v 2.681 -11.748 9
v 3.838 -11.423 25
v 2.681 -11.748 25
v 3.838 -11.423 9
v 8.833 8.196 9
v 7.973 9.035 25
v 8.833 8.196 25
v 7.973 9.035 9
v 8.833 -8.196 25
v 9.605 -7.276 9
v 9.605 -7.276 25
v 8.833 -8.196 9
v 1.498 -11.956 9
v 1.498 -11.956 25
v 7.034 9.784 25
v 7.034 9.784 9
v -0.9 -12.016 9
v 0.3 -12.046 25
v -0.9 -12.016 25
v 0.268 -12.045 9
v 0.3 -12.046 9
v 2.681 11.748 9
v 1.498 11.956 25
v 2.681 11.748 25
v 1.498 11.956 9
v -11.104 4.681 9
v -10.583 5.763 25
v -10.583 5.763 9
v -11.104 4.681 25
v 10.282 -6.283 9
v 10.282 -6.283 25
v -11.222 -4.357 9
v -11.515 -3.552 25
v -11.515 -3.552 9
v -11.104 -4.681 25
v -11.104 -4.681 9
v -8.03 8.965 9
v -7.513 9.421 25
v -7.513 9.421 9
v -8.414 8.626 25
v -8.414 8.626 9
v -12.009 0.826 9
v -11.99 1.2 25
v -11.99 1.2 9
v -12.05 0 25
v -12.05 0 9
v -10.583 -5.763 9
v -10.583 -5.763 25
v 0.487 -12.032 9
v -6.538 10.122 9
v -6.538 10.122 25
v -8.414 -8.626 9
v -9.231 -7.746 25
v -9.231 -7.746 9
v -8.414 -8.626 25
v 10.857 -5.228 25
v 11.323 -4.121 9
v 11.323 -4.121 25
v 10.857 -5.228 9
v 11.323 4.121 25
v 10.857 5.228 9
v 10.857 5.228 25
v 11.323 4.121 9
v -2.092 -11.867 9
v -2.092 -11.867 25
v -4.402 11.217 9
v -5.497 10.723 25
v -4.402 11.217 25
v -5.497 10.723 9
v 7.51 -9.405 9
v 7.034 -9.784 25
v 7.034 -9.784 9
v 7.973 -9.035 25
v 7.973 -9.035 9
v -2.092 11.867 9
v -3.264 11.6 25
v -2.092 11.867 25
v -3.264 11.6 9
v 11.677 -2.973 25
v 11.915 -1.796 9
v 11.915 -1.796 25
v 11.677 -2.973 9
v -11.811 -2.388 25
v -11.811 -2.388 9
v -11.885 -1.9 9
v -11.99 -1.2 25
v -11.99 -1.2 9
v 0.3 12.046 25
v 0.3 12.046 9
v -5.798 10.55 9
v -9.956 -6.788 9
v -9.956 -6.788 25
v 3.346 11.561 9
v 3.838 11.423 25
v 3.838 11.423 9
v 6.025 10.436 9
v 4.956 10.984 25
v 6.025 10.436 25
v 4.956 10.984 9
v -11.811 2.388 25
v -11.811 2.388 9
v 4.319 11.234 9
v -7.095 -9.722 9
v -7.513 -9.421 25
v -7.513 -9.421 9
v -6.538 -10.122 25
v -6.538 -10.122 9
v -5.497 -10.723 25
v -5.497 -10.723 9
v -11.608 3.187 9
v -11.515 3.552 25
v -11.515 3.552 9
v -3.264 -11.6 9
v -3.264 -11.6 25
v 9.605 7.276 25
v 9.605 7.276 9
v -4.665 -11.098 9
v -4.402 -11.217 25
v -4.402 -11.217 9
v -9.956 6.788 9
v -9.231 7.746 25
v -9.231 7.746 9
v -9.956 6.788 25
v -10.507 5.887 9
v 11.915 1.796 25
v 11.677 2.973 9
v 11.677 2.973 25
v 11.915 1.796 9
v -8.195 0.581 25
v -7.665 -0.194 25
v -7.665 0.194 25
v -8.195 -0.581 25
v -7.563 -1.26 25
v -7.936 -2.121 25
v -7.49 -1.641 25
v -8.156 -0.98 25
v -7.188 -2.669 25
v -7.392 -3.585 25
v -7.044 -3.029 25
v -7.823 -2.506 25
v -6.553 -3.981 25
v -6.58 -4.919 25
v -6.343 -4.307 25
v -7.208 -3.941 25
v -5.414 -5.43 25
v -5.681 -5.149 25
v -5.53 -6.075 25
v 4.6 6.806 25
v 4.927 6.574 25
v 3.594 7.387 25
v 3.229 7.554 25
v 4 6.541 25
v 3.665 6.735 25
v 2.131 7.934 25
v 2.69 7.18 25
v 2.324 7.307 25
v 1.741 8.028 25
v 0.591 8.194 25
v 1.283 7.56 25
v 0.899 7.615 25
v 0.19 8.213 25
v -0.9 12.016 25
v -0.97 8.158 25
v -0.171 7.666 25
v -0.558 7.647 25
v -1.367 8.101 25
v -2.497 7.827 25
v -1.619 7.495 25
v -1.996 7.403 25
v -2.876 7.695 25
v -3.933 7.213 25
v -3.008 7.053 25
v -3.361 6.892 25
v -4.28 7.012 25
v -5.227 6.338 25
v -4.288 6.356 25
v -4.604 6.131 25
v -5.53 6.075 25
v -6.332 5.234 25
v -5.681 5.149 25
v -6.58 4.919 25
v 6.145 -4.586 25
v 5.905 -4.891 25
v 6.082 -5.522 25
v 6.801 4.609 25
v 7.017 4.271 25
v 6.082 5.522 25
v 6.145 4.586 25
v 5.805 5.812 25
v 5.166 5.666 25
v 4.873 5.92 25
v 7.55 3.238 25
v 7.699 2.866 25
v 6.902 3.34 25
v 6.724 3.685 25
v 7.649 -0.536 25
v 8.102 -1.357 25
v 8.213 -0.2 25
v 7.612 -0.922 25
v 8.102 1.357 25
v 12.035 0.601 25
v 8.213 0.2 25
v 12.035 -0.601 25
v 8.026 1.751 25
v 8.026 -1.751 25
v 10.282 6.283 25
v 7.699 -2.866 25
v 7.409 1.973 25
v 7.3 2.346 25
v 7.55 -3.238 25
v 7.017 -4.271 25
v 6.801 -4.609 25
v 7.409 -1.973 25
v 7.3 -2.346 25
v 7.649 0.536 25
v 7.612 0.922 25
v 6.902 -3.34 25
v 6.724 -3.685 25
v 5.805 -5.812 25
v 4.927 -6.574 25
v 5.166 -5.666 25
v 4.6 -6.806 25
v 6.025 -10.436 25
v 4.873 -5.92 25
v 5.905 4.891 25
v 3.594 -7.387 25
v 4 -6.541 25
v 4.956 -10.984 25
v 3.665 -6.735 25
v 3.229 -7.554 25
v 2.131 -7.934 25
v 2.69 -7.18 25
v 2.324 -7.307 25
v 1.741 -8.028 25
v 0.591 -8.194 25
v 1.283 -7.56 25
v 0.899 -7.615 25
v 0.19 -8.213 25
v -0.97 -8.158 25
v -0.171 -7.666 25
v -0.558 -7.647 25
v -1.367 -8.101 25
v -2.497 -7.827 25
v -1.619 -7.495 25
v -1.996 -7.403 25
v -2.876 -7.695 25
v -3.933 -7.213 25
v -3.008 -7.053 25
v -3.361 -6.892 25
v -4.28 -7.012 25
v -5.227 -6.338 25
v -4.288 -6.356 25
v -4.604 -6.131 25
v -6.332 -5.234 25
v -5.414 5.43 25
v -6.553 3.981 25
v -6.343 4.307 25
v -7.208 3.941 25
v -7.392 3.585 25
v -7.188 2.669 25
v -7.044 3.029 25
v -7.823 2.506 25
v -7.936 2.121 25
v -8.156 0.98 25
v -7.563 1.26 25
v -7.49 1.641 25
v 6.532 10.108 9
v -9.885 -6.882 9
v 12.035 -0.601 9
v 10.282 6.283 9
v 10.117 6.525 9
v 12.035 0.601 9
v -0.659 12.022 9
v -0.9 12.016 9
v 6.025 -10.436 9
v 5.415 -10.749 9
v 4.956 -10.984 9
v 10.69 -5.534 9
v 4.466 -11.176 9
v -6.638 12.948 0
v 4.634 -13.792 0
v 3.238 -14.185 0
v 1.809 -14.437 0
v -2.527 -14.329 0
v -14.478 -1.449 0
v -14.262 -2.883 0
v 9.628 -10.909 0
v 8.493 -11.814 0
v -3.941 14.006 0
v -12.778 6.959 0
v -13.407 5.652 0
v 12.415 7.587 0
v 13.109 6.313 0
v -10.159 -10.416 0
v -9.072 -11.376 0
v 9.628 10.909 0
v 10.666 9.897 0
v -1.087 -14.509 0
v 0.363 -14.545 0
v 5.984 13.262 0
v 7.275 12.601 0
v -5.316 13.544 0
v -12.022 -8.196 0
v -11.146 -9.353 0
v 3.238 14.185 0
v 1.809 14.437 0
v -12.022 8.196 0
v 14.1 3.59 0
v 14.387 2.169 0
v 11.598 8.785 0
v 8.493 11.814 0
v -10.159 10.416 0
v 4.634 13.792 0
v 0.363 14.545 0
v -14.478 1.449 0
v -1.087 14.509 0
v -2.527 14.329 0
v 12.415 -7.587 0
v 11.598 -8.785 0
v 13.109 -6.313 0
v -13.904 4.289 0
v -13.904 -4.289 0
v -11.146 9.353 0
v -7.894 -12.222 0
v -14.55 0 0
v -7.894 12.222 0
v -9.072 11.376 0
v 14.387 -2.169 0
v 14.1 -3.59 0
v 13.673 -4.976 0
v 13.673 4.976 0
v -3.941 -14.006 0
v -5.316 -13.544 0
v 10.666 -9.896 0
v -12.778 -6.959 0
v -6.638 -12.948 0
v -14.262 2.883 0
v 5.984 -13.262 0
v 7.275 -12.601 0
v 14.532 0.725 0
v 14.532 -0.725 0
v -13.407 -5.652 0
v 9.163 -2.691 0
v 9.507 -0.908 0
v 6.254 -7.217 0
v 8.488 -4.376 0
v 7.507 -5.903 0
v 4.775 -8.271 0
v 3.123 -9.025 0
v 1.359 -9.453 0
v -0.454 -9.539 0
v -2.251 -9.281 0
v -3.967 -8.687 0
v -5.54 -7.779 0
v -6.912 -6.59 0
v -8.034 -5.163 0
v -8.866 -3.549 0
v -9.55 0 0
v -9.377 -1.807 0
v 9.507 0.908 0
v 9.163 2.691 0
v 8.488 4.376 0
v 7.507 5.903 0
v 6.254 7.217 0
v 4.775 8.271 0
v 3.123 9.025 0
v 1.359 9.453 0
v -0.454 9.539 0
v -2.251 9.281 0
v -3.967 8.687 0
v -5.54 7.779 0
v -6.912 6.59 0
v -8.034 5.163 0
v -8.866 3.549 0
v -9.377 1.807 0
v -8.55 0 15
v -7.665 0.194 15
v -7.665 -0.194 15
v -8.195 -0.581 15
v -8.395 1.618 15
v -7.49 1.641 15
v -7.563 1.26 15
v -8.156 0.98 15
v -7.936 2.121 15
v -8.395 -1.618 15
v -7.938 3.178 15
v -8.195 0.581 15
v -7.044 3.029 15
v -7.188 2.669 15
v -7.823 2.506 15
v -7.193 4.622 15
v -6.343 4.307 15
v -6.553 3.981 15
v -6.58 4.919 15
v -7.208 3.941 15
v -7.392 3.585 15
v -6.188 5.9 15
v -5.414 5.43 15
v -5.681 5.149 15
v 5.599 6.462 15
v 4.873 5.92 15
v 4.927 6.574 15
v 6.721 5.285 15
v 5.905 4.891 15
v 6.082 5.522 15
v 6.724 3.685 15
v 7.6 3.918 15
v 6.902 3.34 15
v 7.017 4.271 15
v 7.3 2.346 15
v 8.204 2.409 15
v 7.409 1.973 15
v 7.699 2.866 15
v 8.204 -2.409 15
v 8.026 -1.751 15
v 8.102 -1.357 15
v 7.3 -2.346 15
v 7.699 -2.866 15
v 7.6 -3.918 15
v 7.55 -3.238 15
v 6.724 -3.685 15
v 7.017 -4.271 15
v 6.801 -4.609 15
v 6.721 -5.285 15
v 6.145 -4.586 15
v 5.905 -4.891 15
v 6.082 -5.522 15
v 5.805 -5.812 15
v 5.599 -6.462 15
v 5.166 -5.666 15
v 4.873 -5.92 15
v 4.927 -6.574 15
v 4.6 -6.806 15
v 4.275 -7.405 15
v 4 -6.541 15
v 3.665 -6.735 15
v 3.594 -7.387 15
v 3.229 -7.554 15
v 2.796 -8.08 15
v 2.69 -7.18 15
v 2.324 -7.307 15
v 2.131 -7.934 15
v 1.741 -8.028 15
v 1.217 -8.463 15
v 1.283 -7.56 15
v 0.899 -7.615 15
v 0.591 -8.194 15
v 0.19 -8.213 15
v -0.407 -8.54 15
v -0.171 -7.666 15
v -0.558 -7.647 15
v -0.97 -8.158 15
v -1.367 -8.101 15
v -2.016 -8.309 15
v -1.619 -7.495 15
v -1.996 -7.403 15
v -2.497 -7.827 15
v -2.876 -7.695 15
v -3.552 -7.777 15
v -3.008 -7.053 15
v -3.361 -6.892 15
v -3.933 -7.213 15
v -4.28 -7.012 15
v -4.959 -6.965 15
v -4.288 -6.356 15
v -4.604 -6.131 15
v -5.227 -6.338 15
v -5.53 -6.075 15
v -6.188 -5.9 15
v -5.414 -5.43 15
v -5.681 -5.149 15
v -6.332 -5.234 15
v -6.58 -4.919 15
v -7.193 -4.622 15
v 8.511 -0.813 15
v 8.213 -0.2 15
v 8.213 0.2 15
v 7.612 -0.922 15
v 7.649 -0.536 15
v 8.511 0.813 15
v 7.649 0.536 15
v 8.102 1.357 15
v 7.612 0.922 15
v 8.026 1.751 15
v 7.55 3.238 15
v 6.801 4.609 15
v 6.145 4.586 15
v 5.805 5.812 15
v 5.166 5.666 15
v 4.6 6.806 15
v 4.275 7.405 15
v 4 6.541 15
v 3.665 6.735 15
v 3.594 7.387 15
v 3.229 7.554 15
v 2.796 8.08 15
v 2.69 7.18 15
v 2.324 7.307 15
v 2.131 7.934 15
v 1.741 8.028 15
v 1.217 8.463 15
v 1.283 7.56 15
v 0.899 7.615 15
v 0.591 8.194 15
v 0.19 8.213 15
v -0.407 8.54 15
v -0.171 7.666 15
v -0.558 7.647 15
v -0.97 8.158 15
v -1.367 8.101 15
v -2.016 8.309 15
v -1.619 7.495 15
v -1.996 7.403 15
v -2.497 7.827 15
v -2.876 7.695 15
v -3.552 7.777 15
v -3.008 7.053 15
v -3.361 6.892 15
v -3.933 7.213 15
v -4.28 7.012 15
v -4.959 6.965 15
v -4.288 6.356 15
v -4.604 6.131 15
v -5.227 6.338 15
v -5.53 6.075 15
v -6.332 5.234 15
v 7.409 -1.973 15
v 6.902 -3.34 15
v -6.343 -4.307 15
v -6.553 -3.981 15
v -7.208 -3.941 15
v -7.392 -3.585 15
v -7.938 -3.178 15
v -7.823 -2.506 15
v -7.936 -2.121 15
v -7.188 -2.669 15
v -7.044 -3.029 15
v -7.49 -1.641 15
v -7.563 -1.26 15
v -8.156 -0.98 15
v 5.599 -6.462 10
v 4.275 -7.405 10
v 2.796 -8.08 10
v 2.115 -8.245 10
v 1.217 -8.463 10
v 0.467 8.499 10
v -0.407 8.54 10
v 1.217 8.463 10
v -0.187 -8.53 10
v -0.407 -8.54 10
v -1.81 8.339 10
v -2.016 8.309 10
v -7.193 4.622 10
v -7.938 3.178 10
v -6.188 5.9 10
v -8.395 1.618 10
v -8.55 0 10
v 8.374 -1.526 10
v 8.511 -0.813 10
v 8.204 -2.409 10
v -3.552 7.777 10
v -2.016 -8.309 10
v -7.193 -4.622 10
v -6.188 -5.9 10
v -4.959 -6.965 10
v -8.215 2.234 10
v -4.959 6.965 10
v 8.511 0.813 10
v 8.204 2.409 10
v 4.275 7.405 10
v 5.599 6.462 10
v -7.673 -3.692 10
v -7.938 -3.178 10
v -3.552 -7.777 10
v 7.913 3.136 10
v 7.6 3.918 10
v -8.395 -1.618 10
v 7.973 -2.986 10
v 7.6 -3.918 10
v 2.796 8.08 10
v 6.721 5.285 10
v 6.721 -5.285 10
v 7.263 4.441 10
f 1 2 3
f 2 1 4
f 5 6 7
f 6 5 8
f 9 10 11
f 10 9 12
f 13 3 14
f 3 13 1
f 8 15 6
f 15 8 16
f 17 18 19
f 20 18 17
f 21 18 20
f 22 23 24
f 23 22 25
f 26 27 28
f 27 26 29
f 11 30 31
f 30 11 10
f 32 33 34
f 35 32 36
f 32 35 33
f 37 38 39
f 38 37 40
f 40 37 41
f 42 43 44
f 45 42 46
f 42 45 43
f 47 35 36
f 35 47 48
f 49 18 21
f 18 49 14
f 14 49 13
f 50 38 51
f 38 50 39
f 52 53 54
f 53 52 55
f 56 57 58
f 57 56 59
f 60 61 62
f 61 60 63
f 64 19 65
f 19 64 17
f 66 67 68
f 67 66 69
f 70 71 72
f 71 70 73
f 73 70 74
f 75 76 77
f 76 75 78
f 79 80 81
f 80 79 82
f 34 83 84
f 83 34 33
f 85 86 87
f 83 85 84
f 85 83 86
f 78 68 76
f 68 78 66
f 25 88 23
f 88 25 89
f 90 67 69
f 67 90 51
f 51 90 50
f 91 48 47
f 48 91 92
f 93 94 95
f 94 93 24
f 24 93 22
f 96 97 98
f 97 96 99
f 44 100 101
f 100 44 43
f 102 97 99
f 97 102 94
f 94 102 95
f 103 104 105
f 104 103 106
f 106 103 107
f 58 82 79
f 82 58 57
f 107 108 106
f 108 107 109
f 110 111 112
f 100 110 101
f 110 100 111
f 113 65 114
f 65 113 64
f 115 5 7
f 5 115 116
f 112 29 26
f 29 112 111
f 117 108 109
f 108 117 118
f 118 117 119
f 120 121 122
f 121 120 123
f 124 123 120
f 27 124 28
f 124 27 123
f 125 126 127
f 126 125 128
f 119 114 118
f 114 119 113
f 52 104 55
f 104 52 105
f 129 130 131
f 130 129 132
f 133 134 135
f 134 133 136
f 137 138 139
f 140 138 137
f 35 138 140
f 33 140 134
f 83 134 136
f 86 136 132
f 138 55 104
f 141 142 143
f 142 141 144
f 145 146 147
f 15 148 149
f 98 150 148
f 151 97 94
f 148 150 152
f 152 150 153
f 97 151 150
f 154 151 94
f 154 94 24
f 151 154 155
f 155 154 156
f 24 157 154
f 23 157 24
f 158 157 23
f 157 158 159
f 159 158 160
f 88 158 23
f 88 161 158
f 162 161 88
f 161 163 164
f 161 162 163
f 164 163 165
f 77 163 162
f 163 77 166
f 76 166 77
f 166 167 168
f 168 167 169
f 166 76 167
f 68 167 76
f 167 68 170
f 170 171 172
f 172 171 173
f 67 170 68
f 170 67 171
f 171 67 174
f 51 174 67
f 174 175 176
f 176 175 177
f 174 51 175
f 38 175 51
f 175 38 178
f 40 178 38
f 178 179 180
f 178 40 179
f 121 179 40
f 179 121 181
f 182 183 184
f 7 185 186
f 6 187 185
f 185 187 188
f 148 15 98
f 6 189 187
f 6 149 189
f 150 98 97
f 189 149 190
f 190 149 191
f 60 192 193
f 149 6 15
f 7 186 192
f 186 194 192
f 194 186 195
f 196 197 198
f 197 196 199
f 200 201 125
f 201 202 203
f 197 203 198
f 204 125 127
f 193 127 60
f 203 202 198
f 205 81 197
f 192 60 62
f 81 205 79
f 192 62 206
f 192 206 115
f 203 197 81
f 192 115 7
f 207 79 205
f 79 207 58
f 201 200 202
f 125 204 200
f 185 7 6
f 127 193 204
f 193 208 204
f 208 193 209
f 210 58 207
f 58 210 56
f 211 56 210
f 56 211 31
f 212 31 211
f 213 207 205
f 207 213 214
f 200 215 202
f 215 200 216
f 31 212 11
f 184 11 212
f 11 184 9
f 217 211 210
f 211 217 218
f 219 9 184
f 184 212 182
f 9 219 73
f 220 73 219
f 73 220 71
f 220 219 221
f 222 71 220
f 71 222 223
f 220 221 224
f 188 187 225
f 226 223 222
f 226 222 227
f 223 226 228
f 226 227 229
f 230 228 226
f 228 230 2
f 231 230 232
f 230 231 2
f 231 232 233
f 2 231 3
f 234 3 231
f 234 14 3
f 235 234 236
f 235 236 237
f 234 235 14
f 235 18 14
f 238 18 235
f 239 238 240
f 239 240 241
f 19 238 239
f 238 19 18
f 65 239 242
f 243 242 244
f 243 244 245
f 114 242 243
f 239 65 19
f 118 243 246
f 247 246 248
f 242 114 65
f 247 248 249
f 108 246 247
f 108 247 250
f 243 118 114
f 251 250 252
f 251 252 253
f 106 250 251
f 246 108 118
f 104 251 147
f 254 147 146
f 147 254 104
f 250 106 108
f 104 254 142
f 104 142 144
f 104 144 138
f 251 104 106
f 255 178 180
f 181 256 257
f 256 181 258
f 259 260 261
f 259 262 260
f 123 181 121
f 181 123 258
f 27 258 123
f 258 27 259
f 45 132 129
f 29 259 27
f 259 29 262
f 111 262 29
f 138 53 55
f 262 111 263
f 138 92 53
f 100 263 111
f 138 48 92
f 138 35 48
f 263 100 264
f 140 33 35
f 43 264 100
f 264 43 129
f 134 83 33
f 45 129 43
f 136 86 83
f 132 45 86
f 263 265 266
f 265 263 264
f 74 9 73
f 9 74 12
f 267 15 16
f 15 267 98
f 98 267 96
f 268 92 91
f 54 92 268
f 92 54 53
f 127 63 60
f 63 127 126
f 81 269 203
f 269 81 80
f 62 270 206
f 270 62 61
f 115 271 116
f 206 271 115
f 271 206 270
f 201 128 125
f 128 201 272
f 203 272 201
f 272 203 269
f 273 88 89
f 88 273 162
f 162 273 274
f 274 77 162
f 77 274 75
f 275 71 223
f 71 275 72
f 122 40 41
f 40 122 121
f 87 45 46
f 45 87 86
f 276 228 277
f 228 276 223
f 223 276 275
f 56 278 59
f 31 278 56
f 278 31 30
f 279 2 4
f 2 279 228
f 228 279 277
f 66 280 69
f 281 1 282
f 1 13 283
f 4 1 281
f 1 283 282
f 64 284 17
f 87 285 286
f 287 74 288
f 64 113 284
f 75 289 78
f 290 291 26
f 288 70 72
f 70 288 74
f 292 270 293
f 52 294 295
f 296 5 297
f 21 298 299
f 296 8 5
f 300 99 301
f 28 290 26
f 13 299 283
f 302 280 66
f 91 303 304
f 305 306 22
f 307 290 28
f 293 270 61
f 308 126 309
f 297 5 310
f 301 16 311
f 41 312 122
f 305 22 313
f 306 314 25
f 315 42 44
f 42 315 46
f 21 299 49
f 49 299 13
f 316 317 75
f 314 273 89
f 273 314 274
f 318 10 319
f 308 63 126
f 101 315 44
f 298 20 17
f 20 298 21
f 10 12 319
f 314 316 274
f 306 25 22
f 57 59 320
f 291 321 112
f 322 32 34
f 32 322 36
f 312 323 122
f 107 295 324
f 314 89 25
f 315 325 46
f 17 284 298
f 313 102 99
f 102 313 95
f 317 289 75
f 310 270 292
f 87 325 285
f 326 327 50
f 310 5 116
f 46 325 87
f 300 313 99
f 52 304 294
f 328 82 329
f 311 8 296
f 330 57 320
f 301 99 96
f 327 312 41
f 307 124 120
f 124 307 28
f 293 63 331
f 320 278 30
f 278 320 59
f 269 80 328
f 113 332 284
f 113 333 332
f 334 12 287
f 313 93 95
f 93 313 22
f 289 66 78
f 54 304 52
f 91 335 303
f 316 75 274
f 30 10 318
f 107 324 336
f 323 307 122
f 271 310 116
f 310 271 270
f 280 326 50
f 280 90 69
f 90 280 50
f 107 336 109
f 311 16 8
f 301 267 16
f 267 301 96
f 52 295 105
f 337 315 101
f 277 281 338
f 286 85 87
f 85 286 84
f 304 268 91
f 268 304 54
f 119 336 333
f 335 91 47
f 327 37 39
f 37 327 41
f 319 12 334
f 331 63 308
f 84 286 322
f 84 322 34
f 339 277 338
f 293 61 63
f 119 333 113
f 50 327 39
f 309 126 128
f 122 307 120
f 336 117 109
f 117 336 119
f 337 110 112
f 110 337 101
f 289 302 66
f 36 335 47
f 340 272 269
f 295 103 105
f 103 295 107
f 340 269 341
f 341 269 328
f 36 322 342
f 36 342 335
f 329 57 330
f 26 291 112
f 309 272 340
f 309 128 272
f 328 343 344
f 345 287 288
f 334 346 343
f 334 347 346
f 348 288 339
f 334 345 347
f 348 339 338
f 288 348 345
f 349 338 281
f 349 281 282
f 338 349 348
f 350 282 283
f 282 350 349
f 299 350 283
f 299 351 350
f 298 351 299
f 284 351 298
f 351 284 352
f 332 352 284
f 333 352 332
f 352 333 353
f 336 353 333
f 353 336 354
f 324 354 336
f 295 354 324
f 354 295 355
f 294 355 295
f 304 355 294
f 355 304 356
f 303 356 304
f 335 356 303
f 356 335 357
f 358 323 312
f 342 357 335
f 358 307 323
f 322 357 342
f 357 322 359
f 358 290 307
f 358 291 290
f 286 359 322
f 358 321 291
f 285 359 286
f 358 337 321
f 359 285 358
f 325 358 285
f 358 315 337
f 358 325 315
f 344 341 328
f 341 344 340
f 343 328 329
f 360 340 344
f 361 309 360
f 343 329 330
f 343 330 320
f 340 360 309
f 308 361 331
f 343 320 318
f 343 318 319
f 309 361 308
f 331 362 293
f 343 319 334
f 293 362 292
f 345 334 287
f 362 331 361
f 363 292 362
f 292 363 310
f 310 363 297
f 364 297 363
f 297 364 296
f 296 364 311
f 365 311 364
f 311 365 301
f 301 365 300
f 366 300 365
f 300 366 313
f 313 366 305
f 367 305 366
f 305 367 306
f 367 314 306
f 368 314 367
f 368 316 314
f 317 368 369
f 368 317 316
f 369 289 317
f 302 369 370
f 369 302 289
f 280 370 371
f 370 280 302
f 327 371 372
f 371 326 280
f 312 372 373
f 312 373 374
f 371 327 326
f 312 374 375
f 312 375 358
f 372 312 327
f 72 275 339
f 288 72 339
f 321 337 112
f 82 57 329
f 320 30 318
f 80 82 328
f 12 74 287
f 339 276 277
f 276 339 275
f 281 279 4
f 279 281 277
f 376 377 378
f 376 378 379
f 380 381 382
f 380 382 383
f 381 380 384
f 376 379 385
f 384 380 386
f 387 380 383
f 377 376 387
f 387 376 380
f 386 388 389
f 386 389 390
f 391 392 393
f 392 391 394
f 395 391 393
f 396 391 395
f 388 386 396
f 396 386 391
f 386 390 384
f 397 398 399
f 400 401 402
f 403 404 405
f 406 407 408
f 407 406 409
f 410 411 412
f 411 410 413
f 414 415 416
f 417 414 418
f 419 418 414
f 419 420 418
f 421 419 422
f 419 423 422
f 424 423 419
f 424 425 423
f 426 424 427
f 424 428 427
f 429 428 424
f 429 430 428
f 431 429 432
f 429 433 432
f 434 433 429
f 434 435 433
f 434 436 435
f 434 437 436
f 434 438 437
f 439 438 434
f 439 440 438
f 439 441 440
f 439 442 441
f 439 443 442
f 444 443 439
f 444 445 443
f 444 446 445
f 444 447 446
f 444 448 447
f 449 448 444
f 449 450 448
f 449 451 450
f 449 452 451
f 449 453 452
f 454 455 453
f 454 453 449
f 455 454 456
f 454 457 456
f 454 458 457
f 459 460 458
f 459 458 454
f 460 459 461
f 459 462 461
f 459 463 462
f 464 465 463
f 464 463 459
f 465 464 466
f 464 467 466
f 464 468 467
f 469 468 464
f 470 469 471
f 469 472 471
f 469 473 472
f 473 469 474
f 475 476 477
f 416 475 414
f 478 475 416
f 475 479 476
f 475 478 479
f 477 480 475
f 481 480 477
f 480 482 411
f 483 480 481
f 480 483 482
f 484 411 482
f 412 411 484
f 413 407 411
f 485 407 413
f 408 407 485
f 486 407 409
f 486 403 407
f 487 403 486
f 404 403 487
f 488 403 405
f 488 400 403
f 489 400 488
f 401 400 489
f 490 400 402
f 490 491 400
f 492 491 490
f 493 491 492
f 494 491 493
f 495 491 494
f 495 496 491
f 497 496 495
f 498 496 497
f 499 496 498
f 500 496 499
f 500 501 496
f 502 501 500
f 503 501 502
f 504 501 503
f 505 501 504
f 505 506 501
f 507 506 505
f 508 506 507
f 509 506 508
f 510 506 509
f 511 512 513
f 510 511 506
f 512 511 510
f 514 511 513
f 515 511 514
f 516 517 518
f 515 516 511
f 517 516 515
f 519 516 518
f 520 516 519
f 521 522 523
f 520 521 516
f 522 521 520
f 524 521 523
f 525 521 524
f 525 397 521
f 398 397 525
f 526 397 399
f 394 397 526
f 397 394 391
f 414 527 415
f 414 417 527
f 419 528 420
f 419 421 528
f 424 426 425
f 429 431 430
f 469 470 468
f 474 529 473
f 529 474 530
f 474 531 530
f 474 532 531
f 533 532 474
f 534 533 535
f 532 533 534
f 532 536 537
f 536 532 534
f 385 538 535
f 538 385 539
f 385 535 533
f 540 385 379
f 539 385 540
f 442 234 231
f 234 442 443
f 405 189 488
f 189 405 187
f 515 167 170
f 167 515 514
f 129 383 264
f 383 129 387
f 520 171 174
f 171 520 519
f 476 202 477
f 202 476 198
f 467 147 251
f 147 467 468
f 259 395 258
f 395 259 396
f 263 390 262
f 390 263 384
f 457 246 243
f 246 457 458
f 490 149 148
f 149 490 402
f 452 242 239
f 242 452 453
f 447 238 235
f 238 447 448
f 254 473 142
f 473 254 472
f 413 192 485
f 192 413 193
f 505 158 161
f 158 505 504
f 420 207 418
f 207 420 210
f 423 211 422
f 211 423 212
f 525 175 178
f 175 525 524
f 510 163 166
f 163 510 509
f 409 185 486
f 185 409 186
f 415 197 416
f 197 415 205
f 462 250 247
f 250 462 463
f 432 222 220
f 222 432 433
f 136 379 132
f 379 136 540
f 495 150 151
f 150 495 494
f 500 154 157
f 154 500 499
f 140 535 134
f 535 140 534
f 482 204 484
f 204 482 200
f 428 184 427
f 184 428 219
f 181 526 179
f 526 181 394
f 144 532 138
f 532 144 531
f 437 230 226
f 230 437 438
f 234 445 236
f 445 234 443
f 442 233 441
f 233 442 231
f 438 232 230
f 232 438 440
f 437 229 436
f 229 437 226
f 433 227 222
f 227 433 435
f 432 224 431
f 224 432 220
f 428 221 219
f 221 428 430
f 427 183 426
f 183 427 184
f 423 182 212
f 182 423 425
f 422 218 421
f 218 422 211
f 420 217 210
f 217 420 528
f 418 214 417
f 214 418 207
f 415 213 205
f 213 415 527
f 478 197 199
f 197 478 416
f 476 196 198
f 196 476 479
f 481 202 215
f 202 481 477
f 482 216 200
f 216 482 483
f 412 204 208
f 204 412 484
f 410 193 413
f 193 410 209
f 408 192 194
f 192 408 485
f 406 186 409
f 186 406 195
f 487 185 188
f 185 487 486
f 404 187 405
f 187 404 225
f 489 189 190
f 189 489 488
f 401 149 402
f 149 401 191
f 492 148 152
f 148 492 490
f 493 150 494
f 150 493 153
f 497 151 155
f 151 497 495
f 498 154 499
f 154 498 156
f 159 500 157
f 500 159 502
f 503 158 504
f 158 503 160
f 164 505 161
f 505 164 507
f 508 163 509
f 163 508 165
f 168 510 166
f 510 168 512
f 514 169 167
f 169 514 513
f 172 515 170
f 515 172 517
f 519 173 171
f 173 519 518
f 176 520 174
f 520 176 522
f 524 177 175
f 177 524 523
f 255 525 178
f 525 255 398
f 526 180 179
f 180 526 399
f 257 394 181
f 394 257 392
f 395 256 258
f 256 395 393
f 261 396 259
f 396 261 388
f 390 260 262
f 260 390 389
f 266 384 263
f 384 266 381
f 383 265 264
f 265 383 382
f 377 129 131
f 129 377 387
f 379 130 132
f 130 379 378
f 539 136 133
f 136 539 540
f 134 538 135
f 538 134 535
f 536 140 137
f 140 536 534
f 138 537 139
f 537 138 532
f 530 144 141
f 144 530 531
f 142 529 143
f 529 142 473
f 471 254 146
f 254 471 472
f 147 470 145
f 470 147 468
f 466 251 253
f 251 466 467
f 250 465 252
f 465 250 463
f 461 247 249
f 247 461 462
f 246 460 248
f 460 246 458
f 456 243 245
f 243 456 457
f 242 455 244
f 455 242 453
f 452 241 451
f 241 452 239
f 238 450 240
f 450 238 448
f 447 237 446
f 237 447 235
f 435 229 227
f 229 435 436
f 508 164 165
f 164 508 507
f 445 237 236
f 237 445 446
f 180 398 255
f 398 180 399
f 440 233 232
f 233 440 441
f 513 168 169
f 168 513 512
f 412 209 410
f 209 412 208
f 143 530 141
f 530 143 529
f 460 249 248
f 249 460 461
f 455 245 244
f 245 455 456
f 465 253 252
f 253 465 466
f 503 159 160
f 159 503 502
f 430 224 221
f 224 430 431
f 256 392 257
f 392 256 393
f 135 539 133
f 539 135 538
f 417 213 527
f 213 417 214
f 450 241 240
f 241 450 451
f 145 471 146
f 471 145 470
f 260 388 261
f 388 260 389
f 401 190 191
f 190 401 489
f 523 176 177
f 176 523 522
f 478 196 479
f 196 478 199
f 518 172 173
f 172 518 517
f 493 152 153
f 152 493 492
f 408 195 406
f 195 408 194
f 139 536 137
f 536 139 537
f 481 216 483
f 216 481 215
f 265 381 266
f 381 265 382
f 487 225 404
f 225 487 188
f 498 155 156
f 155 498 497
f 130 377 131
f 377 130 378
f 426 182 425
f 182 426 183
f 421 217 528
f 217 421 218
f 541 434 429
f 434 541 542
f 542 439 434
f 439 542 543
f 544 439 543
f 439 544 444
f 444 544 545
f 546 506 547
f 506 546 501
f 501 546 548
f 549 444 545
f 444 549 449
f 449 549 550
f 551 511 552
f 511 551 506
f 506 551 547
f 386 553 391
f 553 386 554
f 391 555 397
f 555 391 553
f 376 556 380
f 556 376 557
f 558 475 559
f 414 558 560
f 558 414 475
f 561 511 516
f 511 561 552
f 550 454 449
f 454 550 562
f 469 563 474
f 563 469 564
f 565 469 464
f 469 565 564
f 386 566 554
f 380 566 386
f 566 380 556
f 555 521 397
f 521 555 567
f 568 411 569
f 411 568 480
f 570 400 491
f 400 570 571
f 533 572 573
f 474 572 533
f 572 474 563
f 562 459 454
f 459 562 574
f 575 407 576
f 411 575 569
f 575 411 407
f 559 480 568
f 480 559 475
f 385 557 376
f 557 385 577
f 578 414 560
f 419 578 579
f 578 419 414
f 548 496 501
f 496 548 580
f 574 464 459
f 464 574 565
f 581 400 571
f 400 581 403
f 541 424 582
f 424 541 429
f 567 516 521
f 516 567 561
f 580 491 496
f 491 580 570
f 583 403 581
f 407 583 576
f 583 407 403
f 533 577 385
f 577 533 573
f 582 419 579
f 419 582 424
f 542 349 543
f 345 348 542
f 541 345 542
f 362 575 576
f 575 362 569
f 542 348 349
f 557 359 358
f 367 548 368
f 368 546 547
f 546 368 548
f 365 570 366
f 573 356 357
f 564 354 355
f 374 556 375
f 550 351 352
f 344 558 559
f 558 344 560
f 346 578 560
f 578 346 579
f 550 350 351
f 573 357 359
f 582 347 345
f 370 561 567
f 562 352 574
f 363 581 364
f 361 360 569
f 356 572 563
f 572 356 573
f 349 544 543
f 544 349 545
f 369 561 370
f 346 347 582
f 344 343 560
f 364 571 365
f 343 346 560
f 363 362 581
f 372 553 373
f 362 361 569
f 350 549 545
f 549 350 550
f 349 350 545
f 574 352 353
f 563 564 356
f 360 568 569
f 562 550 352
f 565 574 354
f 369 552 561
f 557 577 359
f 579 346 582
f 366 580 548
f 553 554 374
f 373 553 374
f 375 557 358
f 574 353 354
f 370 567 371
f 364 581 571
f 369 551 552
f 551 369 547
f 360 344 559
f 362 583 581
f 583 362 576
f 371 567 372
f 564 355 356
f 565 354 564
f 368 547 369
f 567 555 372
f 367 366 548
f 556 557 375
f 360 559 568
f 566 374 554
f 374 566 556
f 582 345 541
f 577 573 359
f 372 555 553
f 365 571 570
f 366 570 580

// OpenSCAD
/*
    SHAPES
*/
module star(inner_diameter, outer_diameter, steps, height) {
    r1 = outer_diameter / 2;
    r2 = inner_diameter / 2;
    linear_extrude(height = height) 
        polygon(points=[for (i = [0:2*steps-1]) 
            let (angle = i * 360 / (2*steps)) 
            if (i % 2 == 0) 
                [r1*cos(angle), r1*sin(angle)] 
            else 
                [r2*cos(angle), r2*sin(angle)]
        ]);
}

module cylinder_extrude($fn, r, h, scale = 1) {
    linear_extrude(height = h, scale = scale)
    polygon(points=[for (i = [0:$fn-1])
        let (angle = i * 360 / $fn)
        [r*cos(angle), r*sin(angle)]
    ]);
}

module circular(diameter, steps, height) {
    cylinder_extrude($fn = steps, r = diameter / 2, h = height);
}

module donut(inner_diameter, outer_diameter, steps, height) {
  difference() {
    circular(outer_diameter, steps, height);
    circular(inner_diameter, steps, height);
  }  
}

/*
    SPLINES
*/

module spline(steps = 20, di = 8.5, do = 6.5, ci = 0.6, co = 0.6, height = 10) {
    union() {
        difference() {
            star(di, do, steps, height);
            rotate(a = 360 / steps / 2) {
                donut(do - co, do + 100, steps, height);
            }
        }
        
        circular(di + ci, steps, height);
    }
}

module big_spline(height) {
    steps = 63;
    
    // between PLA and METAL:
    // 0.3mm outer diameter difference (PLA-, METAL+) 22.6, 22.9
    // 0.2mm inner diameter difference (PLA-, METAL+) 22.4, 22.6
    
    // both lowered 0.3mm (final: 22.8 to 22.5)
    
    // di lowered an additional 0.3mm
    // di = 21.5;
    //di = 20.9;
    di = 21.2;
    
    // do = 23.5;
    //do = 23.2;
    do = 23.5;
    
    // cutoff
    ci = 0.6;
    co = 0.6;
    
    spline(steps, di, do, ci, co, height);
}

module small_spline(height) {
    steps = 33;
    
    // between PLA and METAL:
    // 0.1mm outer difference (PLA-, METAL+)

    
    // with inner 14.7, outer 16.7:
    // 15.2 measured inner diameter
    // 15.9 measured outer diameter
    
    // todo:
    // increase hole by 0.3mm (new measured: 15.5 inner, 16.2 outer)
    // make outer flatter (spline teeth are flat)
    
    // both increased 0.3mm (final: 16.1 to 16.4)
    // do increased by additional 0.3mm
    
    //di = 14.7;
    di = 14.8; // was 14.7
    
    // do = 16.7;
    do = 17.1; // was 17.0
    
    // cutoff
    ci = 0.6;
    co = 0.6;
    
    spline(steps, di, do, ci, co, height);
}

/*
    ADAPTER

    NOTES TO CONSIDER:

    Spacing
    - The wheel needs spacing (at least 5mm) from the flat plastic (in line with the clockspring)
    - Currently, the spacing is 0mm (scrapes the plastic)
    
    Gradients
*/

module small_shaft() {
    spline_offset = 15;
    allowance = 0.1; // 0.4 lines up with the inner spline radius
    
    // cylinder 1 (above inner spline) dt = 16, db = 16
    //c1_dt = 15.0;
    //c1_db = 15.0;
    //c1_offset = 22;
    
    // cylinder 2 (below inner spline) dt = 17, db = 17
    c2_dt = 17;
    c2_db = 17;
    c2_offset = 10;
    
    // cylinder 3 (below cylinder 2) dt = 17, db = 19
    c3_dt = 17;
    c3_db = 19; // old: 19 (+ 0.2 for extra 1mm)
    c3_offset = 0;
    
    // radius calculation
    //c1_rt = (c1_dt + allowance) / 2;
    //c1_rb = (c1_db + allowance) / 2;
    c2_rt = (c2_dt + allowance) / 2;
    c2_rb = (c2_db + allowance) / 2;
    c3_rt = (c3_dt + allowance) / 2;
    c3_rb = (c3_db + allowance) / 2;
    
    //translate([0, 0, c1_offset]) rotate(a = 360 / 33 / 2) cylinder_extrude($fn = 33, h = 8, r = c1_rb, scale = (c1_rt/c1_rb));
    translate([0, 0, spline_offset]) small_spline(10);
    translate([0, 0, c2_offset]) rotate(a = 360 / 33 / 2) cylinder_extrude($fn = 33, h = 5, r = c2_rb, scale = (c2_rt/c2_rb));
    translate([0, 0, c3_offset]) rotate(a = 360 / 33 / 2) cylinder_extrude($fn = 33, h = 10, r = c3_rb, scale = (c3_rt/c3_rb));
}

module big_shaft() {
    spline_offset = 18; // used to be 20
    allowance = 0.1; // BEFORE PRINTING: set to 0
    
    // cylinder 1 (below outer spline)
    c1_dt = 24;
    c1_db = 24;
    c1_offset = 9;
    
    // cylinder 2 (below cylinder 1)
    c2_dt = 24;
    c2_db = 29; // used to be 30
    c2_offset = 0;
    
    // cylinder 3 (below cylinder 2)
    
    //c3_dt = 29;
    //c3_db = 29;
    //c3_offset = 0;
    
    // radius calculation
    c1_rt = (c1_dt + allowance) / 2;
    c1_rb = (c1_db + allowance) / 2;
    c2_rt = (c2_dt + allowance) / 2;
    c2_rb = (c2_db + allowance) / 2;
    //c3_rt = (c3_dt + allowance) / 2;
    //c3_rb = (c3_db + allowance) / 2;
    
    //translate([0, 0, spline_offset]) big_spline(11);
    translate([0, 0, c1_offset]) rotate(a = 360 / 63 / 2) cylinder_extrude($fn = 63, h = 16, r = c1_rb, scale = (c1_rt/c1_rb)); // h used to be 10
    translate([0, 0, c2_offset]) rotate(a = 360 / 63 / 2) cylinder_extrude($fn = 63, h = 9, r = c2_rb, scale = (c2_rt/c2_rb));
    //translate([0, 0, c3_offset]) rotate(a = 360 / 63 / 2) cylinder_extrude($fn = 63, h = 1, r = c3_rb, scale = (c3_rt/c3_rb));
}

// Example usage
rotate([0, 0, 0])
difference() {
    big_shaft();
    small_shaft();
}
